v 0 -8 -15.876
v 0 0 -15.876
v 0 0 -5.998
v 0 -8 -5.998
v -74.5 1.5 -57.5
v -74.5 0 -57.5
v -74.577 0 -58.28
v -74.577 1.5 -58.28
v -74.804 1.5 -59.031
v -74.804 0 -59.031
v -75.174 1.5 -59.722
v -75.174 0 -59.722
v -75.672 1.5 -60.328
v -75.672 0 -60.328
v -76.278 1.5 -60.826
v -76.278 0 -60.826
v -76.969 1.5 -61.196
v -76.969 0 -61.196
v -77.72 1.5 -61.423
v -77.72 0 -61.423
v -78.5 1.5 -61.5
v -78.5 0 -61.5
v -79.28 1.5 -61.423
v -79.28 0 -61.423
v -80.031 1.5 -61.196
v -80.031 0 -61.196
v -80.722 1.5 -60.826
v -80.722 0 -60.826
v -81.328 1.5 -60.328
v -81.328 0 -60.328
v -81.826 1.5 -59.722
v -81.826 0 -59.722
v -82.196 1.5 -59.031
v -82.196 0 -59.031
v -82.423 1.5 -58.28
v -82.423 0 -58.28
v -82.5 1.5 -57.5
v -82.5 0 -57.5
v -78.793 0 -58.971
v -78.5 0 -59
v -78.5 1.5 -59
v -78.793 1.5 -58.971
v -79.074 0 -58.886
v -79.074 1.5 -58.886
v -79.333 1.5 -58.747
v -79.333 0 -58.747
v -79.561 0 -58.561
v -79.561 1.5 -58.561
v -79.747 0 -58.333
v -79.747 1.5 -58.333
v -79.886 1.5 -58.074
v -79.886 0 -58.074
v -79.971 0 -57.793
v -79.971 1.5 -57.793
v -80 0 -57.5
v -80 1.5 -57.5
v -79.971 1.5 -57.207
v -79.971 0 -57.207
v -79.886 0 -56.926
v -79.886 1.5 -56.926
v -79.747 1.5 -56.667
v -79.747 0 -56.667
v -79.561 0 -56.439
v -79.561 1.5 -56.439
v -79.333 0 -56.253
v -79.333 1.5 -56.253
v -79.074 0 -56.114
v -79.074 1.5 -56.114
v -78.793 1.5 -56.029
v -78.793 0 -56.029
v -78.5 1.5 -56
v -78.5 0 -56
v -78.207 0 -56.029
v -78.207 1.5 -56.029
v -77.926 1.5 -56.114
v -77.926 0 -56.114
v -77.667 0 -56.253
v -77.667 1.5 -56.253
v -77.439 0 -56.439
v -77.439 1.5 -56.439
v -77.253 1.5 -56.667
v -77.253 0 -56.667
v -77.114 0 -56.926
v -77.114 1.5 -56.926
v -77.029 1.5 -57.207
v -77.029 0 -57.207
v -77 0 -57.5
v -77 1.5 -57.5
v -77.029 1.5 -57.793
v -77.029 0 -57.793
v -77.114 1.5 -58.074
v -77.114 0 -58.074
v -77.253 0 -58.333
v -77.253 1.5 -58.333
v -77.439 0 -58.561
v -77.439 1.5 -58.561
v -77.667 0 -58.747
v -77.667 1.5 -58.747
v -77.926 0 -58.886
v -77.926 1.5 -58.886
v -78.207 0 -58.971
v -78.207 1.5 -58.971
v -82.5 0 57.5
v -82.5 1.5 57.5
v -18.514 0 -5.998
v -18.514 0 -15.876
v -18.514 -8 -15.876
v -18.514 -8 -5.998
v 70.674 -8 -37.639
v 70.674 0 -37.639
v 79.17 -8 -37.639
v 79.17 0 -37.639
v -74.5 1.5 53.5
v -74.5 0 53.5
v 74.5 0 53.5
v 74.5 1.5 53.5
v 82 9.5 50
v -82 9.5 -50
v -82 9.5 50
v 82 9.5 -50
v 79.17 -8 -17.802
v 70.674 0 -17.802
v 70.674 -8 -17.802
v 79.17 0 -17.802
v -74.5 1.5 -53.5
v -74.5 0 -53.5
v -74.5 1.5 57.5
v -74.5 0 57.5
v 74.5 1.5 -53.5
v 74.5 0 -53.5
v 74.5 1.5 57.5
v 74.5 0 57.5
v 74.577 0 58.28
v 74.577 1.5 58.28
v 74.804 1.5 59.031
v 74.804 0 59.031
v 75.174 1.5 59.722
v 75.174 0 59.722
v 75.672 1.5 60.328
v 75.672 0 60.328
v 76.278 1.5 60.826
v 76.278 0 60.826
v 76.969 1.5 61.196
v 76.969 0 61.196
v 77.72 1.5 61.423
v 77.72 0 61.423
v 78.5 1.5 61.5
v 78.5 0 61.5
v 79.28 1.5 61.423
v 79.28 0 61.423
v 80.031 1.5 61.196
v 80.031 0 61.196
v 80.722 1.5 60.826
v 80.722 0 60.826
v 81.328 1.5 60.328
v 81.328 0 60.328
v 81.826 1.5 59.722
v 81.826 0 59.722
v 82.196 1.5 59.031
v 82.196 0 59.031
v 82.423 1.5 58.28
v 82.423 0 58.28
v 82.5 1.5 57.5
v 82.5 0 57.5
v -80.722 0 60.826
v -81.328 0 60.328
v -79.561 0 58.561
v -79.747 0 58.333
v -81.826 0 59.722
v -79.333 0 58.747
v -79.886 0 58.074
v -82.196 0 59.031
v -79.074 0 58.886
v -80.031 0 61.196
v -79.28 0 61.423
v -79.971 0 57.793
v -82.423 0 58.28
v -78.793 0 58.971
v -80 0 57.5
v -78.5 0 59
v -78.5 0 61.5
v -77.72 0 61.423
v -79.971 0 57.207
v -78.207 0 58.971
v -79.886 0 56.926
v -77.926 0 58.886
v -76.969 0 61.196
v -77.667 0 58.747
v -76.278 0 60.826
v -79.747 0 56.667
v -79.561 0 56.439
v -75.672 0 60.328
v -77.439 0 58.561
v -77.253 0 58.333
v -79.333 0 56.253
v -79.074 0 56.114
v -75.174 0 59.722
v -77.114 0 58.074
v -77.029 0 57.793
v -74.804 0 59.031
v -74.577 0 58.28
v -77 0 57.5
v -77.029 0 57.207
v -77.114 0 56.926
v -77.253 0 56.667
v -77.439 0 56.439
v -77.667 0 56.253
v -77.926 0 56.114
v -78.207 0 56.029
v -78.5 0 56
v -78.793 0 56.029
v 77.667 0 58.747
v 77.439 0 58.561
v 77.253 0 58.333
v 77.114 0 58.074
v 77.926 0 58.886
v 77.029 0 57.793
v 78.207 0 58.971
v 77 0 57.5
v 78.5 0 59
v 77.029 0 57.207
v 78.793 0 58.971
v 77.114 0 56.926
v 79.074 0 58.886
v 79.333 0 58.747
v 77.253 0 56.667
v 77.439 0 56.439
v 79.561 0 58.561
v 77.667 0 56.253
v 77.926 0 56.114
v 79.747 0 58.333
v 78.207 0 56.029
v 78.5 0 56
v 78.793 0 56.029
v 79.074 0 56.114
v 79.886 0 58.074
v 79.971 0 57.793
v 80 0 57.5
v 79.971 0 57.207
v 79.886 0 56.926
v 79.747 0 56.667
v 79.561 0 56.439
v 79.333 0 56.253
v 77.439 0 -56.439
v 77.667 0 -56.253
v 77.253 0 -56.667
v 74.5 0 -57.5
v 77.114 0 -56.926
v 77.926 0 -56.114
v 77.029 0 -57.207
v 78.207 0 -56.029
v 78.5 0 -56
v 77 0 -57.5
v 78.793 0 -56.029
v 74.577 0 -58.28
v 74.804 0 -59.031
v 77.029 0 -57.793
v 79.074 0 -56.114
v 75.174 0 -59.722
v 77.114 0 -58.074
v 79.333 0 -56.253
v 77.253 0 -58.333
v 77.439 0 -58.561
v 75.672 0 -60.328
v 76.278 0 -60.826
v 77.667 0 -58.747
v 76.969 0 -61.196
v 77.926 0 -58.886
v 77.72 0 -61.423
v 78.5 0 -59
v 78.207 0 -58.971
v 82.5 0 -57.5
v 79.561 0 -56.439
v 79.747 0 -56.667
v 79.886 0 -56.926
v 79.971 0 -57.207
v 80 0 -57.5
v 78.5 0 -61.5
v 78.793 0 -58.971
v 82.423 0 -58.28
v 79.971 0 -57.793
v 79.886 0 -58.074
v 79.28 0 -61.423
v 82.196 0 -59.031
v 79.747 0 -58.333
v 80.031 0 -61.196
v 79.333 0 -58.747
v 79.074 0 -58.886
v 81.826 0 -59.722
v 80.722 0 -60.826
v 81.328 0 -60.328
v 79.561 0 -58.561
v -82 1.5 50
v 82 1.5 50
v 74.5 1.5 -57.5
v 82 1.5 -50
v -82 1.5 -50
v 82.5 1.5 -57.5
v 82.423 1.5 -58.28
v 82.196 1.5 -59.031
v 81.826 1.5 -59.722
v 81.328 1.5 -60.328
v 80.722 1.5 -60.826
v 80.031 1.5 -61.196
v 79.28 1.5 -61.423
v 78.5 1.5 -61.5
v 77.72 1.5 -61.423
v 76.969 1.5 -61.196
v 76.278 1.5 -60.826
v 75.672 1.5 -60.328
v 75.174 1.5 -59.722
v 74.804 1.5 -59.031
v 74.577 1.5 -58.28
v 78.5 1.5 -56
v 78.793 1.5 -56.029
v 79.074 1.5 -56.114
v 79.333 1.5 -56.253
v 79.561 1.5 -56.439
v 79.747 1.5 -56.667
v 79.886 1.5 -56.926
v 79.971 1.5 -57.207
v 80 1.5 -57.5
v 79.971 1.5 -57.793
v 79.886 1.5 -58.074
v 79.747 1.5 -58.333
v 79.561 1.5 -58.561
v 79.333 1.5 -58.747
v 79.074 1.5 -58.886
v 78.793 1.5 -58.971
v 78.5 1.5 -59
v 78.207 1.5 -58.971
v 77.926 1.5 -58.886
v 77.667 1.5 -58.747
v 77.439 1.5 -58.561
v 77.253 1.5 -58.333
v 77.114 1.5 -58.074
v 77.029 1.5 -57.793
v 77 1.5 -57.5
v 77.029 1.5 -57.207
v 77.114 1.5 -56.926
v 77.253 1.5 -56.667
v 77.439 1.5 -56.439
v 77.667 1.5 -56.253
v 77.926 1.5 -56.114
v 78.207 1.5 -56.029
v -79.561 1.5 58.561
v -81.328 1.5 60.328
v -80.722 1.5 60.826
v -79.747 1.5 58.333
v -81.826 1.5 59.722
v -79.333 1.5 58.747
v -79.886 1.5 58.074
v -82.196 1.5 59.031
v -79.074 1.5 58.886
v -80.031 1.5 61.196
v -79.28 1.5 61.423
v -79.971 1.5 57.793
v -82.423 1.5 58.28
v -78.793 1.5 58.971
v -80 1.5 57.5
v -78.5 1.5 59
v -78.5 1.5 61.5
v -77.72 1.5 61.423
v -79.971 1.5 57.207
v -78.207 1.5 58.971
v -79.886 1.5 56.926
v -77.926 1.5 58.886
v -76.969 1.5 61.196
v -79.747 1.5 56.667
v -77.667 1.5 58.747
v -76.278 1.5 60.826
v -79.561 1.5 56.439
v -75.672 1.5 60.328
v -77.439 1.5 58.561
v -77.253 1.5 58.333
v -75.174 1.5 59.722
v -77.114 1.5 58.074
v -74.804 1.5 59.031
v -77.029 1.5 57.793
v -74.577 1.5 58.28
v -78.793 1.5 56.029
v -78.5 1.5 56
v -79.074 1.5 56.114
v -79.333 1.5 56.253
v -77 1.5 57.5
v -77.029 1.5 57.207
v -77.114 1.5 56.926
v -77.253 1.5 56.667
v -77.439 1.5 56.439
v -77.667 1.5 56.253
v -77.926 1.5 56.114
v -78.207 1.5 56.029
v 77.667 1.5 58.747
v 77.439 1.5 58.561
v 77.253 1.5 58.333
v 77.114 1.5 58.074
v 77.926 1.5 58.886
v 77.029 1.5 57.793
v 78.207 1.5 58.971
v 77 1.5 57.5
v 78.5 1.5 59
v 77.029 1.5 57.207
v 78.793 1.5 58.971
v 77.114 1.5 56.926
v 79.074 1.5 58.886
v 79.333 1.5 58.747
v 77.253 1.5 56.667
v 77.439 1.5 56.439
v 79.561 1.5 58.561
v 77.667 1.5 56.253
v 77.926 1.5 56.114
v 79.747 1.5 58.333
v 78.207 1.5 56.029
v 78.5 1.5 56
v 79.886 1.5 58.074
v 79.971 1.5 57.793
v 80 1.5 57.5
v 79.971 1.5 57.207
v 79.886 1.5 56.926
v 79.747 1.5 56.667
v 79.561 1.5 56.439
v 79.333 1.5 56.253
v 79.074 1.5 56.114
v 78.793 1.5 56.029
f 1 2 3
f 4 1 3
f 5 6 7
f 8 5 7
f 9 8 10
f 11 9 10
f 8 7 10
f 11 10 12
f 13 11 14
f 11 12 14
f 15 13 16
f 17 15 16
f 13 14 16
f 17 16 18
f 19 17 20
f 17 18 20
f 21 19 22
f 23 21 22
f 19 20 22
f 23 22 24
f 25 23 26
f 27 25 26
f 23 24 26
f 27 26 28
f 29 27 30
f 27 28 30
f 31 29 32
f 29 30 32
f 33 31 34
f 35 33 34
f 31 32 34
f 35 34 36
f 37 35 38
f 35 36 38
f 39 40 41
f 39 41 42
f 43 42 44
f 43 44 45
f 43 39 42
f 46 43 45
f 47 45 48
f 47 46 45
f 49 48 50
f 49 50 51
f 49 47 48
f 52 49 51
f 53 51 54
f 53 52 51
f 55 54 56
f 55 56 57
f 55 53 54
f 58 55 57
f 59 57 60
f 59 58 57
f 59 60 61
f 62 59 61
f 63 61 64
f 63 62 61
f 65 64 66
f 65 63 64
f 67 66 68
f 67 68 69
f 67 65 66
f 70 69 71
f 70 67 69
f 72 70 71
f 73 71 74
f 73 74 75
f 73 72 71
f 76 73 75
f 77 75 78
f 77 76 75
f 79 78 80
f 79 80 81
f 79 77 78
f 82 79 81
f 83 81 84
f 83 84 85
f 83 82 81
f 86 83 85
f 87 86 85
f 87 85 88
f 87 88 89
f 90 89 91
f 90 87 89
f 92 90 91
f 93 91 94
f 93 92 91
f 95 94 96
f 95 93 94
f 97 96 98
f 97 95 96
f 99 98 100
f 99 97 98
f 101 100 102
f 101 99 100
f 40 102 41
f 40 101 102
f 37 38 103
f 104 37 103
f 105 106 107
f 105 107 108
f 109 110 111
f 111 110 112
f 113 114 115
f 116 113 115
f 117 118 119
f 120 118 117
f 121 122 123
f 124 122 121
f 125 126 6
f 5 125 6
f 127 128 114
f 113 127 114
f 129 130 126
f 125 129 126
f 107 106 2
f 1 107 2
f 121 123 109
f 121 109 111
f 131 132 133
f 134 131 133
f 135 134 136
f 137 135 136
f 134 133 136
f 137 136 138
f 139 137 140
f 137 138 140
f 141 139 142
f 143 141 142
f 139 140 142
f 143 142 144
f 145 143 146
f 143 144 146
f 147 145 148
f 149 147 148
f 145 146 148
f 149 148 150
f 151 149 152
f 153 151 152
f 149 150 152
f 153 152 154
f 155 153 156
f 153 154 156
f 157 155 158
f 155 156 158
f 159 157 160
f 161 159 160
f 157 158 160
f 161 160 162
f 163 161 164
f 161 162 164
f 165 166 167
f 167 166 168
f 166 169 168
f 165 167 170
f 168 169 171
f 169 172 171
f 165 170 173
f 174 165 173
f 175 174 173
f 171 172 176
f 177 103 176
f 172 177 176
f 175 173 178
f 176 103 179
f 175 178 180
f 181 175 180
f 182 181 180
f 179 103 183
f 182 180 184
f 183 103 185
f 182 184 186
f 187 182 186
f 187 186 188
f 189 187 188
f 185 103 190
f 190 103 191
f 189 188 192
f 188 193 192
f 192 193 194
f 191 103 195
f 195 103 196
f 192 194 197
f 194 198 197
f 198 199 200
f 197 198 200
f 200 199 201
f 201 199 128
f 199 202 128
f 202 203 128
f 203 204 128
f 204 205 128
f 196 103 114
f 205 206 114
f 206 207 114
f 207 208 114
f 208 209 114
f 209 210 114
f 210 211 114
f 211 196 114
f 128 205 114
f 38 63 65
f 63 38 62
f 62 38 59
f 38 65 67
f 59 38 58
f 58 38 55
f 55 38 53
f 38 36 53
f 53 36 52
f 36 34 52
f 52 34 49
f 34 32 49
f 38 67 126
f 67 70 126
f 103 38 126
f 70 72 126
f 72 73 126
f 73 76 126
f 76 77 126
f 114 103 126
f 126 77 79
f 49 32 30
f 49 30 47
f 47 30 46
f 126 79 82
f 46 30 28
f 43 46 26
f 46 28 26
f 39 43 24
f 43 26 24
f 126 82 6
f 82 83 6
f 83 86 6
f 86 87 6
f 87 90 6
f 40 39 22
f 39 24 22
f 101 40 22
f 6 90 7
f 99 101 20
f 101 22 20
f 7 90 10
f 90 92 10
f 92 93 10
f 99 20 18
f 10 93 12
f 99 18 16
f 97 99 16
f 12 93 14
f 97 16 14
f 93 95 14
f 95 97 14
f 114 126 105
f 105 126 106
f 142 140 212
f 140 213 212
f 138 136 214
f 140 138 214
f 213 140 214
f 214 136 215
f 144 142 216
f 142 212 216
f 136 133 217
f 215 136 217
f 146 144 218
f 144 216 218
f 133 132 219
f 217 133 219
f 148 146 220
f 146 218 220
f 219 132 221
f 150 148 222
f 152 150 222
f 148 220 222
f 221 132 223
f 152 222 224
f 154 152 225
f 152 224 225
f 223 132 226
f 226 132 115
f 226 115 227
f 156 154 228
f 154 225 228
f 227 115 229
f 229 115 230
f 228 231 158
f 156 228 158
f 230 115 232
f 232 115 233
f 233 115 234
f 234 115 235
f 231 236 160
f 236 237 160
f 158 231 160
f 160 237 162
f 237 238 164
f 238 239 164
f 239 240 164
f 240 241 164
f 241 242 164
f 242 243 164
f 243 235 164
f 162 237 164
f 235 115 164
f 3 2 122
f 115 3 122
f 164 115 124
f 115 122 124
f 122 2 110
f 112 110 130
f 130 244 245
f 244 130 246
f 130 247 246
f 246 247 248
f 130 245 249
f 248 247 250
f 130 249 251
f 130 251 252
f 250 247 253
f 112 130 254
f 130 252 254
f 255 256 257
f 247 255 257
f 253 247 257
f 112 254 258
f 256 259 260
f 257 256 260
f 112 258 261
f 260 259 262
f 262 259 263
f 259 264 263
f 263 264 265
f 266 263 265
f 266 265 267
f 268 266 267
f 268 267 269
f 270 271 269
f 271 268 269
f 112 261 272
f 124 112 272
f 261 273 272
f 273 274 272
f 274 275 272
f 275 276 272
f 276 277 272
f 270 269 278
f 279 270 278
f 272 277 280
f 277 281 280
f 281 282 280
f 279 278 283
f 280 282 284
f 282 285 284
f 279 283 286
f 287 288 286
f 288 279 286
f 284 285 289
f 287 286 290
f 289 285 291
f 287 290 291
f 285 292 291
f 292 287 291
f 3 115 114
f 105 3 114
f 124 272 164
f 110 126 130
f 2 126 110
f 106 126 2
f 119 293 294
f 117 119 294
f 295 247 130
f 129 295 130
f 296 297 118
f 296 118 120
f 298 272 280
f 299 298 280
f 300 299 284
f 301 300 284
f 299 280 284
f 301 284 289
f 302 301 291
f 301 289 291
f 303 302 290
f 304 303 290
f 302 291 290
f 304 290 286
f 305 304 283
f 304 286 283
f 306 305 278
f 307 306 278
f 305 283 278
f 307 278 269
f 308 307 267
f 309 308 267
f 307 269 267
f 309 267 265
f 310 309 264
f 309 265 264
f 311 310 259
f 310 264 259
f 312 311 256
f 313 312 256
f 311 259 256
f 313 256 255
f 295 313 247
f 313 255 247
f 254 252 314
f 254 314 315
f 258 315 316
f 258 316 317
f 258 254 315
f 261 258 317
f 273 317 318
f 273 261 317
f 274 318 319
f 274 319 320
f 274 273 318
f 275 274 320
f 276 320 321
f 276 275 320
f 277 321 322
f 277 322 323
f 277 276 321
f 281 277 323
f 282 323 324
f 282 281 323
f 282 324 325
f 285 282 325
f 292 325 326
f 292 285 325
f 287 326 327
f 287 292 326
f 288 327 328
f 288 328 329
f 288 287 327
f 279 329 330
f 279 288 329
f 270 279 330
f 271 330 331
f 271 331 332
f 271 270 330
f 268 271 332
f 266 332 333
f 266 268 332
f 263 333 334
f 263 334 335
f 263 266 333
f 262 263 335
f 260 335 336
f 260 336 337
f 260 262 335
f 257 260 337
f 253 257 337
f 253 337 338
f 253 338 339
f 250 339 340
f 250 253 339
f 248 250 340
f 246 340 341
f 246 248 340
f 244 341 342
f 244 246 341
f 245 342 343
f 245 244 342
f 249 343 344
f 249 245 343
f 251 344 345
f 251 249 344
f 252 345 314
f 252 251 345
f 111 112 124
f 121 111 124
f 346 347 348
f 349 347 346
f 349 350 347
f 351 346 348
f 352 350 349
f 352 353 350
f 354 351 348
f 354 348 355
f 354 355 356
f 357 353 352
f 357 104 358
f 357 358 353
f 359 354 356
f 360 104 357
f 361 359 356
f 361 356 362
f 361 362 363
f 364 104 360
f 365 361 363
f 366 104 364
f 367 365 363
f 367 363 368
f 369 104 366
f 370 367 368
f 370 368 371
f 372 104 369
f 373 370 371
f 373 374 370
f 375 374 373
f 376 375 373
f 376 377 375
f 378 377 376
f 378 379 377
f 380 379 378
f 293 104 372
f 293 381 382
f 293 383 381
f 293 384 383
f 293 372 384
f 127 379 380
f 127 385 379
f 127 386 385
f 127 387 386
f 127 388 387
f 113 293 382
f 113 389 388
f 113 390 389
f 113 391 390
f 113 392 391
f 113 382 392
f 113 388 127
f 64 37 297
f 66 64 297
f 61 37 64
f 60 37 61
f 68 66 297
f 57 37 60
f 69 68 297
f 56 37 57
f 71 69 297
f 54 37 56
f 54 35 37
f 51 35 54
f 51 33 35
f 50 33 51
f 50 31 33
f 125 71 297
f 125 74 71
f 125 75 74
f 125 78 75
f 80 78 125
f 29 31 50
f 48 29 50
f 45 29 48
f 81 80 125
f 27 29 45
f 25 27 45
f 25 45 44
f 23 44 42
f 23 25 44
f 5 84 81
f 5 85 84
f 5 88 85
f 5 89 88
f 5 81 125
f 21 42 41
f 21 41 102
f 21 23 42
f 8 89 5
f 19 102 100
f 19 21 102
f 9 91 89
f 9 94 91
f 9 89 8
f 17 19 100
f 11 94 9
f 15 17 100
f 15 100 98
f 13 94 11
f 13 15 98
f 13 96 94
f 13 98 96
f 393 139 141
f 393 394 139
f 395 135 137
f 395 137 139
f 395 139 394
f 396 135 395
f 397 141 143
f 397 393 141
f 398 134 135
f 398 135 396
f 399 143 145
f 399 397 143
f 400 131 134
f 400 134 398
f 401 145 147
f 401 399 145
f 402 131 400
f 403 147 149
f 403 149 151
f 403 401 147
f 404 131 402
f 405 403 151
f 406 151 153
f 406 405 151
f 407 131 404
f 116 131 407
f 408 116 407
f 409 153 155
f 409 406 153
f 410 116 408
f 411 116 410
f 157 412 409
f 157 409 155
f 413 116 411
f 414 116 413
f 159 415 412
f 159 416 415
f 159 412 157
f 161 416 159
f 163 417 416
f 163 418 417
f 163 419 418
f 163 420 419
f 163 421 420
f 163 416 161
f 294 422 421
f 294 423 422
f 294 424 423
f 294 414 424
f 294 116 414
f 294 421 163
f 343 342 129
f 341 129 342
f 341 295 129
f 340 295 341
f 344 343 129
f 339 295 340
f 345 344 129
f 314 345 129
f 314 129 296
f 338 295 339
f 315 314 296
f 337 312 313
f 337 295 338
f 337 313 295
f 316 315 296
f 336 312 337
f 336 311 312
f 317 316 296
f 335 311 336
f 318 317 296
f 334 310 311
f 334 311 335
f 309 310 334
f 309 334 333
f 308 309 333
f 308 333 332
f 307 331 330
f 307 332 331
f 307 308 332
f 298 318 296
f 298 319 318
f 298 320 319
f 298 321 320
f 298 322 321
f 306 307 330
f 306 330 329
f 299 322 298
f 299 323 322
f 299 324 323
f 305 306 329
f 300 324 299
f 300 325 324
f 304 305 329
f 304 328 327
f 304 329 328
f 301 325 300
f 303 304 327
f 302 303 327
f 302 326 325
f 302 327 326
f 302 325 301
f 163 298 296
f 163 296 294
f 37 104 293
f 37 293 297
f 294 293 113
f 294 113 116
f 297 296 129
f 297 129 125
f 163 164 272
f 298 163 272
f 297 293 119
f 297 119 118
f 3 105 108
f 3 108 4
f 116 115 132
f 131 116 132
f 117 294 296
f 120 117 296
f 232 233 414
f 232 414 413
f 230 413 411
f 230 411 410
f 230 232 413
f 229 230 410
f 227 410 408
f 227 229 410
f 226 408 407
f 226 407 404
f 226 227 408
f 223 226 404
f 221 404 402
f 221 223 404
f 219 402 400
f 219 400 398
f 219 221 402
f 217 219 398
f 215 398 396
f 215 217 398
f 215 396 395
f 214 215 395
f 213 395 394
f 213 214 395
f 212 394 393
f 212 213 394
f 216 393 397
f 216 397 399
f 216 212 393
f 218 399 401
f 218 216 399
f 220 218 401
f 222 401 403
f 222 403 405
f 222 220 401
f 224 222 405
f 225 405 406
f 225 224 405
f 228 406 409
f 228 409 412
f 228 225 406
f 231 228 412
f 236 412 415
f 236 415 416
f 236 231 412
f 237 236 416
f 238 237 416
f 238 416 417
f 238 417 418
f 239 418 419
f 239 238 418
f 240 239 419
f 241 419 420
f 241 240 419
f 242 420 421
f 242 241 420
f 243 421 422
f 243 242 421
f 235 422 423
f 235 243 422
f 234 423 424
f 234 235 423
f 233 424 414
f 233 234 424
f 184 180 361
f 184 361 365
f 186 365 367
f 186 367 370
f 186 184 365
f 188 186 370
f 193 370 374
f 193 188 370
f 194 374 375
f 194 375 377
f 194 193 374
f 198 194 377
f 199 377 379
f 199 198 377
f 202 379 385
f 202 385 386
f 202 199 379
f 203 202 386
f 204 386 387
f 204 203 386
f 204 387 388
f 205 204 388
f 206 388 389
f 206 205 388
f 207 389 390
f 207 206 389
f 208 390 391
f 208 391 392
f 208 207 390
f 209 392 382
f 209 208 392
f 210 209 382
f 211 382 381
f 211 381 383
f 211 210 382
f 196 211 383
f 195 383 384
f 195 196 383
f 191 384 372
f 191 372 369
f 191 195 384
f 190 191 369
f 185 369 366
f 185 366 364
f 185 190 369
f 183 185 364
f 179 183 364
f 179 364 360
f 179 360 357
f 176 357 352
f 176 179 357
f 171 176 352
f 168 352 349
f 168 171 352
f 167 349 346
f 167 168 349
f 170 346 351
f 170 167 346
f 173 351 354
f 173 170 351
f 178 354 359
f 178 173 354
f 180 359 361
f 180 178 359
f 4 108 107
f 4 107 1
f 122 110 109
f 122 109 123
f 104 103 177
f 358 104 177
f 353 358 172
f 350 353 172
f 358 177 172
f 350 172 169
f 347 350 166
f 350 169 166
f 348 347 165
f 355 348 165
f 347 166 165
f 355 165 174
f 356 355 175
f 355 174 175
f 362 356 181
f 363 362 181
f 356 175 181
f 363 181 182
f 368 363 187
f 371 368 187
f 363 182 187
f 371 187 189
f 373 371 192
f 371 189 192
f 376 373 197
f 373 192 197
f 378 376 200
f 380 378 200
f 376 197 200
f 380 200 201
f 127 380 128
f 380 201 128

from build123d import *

# Parameters (mm, degrees)
SKETCH1_R           = 1.5
BOSS_EXTRUDE1_DEPTH = 1.5
SKETCH2_W           = 8.49594542
SKETCH2_H           = 19.836738538
SKETCH2_W_2         = 18.514132699
SKETCH2_H_2         = 9.878260544
BOSS_EXTRUDE2_DEPTH = 8
SKETCH3_W           = 164
SKETCH3_H           = 100
BOSS_EXTRUDE3_DEPTH = 8


with BuildPart() as part:
    # Sketch1 → Boss-Extrude1 (new body)
    with BuildSketch(Plane(origin=(0, 0, 0), x_dir=(1, 0, 0), z_dir=(0, 1, 0))):
        with BuildLine():
            Line((-74.5, -53.5), (74.5, -53.5))
            Line((74.5, -53.5), (74.5, -57.5))
            ThreePointArc((74.5, -57.5), (78.5, -61.5), (82.5, -57.5))
            Line((82.5, -57.5), (82.5, -23.877612559))
            Line((82.5, -23.877612559), (82.5, 23.877612559))
            Line((82.5, 23.877612559), (82.5, 57.5))
            ThreePointArc((82.5, 57.5), (78.5, 61.5), (74.5, 57.5))
            Line((74.5, 57.5), (74.5, 53.5))
            Line((74.5, 53.5), (-74.5, 53.5))
            Line((-74.5, 53.5), (-74.5, 57.5))
            ThreePointArc((-74.5, 57.5), (-78.5, 61.5), (-82.5, 57.5))
            Line((-82.5, 57.5), (-82.5, 23.877612559))
            Line((-82.5, 23.877612559), (-82.5, -23.877612559))
            Line((-82.5, -23.877612559), (-82.5, -57.5))
            ThreePointArc((-82.5, -57.5), (-78.5, -61.5), (-74.5, -57.5))
            Line((-74.5, -57.5), (-74.5, -53.5))
        make_face()
        with Locations(Location((78.5, 57.5, 0), (0, 0, 270))):
            Circle(SKETCH1_R, mode=Mode.SUBTRACT)
        with Locations(Location((-78.5, 57.5, 0), (0, 0, 90))):
            Circle(SKETCH1_R, mode=Mode.SUBTRACT)
        with Locations(Location((78.5, -57.5, 0), (0, 0, 90))):
            Circle(SKETCH1_R, mode=Mode.SUBTRACT)
        with Locations(Location((-78.5, -57.5, 0), (0, 0, 270))):
            Circle(SKETCH1_R, mode=Mode.SUBTRACT)
    extrude(amount=BOSS_EXTRUDE1_DEPTH)

    # Sketch2 → Boss-Extrude2 (add)
    with BuildSketch(Plane.XZ):
        with Locations((74.922222093, -27.720858346)):
            Rectangle(SKETCH2_W, SKETCH2_H)
        with Locations((-9.25706635, -10.936720321)):
            Rectangle(SKETCH2_W_2, SKETCH2_H_2)
    extrude(amount=BOSS_EXTRUDE2_DEPTH)

    # Sketch3 → Boss-Extrude3 (add)
    with BuildSketch(Plane(origin=(0, 1.5, 0), x_dir=(1, 0, 0), z_dir=(0, 1, 0))):
        Rectangle(SKETCH3_W, SKETCH3_H)
    extrude(amount=BOSS_EXTRUDE3_DEPTH)


solid = part.part
